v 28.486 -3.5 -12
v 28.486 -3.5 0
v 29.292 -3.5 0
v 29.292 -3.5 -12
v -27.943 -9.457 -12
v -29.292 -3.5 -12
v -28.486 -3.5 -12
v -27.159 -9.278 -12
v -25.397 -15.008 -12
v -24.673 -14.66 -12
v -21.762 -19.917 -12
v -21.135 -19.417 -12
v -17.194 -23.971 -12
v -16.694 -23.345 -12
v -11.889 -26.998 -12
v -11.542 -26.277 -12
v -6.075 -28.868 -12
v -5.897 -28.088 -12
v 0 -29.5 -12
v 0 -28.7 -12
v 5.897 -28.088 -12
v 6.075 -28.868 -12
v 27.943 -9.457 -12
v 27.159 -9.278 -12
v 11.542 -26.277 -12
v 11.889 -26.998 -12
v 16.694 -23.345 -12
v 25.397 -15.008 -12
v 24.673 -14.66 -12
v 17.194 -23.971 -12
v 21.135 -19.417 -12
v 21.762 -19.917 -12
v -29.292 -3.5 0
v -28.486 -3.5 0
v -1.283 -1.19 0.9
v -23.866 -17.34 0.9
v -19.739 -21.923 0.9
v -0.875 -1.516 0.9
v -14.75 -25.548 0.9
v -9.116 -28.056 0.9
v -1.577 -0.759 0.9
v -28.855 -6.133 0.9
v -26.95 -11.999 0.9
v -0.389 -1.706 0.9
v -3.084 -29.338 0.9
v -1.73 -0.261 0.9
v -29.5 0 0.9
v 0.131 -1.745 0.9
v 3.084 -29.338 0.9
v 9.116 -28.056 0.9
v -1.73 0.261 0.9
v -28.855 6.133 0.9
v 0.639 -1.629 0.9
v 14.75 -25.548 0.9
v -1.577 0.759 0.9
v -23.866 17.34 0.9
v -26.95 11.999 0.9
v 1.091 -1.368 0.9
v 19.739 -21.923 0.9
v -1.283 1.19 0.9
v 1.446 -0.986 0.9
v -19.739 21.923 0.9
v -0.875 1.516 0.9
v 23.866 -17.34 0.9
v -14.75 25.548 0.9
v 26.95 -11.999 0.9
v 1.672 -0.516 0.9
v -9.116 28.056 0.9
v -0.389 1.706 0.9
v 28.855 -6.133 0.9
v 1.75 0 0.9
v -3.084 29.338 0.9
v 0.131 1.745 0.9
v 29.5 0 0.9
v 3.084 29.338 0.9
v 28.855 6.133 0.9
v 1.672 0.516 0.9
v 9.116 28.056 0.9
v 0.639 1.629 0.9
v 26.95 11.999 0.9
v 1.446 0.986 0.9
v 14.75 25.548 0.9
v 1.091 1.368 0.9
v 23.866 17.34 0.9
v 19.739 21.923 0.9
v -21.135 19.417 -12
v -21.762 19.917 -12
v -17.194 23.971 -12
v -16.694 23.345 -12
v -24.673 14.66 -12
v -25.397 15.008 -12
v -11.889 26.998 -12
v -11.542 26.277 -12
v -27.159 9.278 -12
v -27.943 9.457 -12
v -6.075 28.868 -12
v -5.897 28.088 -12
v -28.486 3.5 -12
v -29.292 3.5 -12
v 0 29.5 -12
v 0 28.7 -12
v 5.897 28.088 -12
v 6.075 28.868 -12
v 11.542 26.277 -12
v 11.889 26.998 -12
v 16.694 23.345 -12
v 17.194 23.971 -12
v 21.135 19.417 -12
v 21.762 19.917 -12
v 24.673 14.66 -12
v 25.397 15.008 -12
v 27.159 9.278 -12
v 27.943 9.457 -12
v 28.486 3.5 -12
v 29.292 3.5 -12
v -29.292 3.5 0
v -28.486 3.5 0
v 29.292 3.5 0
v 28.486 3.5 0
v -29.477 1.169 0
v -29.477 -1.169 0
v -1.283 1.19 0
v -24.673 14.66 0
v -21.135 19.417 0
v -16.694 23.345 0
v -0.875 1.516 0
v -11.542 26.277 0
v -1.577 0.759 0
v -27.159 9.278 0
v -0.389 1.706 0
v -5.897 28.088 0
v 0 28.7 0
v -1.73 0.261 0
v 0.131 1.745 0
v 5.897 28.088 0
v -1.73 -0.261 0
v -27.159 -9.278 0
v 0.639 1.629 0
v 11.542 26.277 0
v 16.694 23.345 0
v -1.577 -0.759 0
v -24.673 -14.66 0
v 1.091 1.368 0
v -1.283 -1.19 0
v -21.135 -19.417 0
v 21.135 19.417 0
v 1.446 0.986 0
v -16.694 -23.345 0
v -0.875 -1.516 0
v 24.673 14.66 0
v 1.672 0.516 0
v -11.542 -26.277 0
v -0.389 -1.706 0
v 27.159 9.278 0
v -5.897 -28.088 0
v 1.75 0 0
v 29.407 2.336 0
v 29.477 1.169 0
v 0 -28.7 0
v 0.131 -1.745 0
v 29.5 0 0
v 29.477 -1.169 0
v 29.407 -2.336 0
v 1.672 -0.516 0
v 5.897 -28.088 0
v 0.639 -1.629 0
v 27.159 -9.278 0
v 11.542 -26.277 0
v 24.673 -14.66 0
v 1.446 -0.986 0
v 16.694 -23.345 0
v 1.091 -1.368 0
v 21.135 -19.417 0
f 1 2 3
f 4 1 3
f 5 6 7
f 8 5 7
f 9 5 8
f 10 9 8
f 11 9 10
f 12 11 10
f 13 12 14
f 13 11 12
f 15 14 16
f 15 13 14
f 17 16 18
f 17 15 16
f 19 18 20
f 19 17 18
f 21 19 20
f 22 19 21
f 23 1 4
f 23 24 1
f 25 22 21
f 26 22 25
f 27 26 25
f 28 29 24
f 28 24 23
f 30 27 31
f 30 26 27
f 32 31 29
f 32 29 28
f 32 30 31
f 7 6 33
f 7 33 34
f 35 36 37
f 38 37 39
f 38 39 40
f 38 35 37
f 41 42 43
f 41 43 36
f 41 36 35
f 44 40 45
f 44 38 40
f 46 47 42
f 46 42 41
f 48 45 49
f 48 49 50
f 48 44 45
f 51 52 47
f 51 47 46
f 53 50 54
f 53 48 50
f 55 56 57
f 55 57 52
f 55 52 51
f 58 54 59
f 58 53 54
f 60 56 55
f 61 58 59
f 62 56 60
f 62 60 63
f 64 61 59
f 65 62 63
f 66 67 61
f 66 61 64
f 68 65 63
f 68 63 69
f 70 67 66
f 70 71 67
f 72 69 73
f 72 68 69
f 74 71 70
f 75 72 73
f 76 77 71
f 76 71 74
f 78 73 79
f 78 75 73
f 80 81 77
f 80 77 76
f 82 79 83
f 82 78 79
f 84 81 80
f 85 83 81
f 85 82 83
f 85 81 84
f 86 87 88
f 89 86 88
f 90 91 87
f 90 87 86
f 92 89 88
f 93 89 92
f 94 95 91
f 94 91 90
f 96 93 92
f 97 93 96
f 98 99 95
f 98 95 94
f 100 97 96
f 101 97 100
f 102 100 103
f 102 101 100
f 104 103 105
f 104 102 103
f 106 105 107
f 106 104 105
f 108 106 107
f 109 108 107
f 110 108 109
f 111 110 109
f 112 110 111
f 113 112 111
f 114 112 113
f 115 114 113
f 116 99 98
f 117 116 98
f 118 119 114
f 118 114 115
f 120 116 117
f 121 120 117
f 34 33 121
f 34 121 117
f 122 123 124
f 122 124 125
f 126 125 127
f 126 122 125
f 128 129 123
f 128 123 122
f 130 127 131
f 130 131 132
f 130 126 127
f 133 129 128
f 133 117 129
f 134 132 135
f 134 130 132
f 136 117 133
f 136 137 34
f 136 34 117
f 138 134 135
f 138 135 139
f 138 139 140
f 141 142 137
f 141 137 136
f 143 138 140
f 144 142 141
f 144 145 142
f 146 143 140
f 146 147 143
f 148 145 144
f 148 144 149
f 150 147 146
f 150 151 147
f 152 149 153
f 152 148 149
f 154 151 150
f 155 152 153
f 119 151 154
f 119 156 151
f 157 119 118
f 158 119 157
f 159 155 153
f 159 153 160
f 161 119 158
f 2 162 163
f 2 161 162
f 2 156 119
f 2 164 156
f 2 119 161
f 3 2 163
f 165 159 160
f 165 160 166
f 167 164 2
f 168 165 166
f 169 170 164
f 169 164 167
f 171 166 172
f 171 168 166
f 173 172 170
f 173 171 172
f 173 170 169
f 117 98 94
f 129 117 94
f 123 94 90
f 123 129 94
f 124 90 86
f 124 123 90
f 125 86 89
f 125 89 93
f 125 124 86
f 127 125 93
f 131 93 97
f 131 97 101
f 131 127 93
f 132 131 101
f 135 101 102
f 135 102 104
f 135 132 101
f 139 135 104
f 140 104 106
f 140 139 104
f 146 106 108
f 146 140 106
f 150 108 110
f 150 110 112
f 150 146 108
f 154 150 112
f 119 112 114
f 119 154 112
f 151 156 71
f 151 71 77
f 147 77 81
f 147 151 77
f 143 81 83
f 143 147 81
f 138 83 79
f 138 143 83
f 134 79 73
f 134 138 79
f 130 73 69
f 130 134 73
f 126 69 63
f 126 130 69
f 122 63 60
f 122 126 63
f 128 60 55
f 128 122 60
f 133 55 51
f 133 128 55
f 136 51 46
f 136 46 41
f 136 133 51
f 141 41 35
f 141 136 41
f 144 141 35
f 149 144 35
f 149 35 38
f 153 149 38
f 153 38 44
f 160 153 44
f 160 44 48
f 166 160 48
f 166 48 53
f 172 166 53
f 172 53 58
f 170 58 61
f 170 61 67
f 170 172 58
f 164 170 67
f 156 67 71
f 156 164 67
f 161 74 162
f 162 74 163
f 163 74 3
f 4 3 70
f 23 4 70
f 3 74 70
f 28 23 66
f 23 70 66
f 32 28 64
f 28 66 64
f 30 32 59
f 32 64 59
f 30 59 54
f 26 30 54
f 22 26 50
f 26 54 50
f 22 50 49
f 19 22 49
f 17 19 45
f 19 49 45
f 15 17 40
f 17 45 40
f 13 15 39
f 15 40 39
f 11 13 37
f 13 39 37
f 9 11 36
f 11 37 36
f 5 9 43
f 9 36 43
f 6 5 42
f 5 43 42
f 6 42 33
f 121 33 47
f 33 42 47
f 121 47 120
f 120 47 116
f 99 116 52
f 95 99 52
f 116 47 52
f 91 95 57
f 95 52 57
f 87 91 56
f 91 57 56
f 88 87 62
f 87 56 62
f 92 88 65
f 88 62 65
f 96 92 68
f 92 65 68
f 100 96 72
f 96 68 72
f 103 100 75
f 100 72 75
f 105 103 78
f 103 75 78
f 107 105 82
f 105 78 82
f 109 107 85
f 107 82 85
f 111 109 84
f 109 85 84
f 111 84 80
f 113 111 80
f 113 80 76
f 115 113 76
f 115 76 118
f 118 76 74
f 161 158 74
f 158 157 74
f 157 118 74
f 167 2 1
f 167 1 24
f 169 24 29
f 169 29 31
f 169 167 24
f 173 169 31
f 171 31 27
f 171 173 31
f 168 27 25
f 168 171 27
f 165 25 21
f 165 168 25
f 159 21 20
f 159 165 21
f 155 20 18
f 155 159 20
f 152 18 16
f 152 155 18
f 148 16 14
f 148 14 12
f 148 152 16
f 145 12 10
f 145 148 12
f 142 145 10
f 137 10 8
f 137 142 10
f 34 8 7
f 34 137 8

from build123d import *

# Parameters (mm, degrees)
F0_R     = 29.5
F0_R_2   = 1.75
F1_DEPTH = 0.9
F2_R     = 29.5
F2_R_2   = 28.7
F3_DEPTH = 12
F4_W     = 59
F4_H     = 7
F5_DEPTH = 12


with BuildPart() as f1:
    # F0 (on Top) → F1 (new body)
    with BuildSketch(Plane.XY):
        Circle(F0_R)
        Circle(F0_R_2, mode=Mode.SUBTRACT)
    extrude(amount=F1_DEPTH)

    # F2 (on face) → F3 (join)
    with BuildSketch(Plane(origin=(0, 0, 0), x_dir=(1, 0, 0), z_dir=(0, 0, -1))):
        Circle(F2_R)
        Circle(F2_R_2, mode=Mode.SUBTRACT)
    extrude(amount=F3_DEPTH)

    # F4 (on face) → F5 (cut, through all)
    with BuildSketch(Plane(origin=(0, 0, -12), x_dir=(1, 0, 0), z_dir=(0, 0, -1))):
        Rectangle(F4_W, F4_H)
    extrude(amount=-F5_DEPTH, mode=Mode.SUBTRACT)


solid = f1.part
